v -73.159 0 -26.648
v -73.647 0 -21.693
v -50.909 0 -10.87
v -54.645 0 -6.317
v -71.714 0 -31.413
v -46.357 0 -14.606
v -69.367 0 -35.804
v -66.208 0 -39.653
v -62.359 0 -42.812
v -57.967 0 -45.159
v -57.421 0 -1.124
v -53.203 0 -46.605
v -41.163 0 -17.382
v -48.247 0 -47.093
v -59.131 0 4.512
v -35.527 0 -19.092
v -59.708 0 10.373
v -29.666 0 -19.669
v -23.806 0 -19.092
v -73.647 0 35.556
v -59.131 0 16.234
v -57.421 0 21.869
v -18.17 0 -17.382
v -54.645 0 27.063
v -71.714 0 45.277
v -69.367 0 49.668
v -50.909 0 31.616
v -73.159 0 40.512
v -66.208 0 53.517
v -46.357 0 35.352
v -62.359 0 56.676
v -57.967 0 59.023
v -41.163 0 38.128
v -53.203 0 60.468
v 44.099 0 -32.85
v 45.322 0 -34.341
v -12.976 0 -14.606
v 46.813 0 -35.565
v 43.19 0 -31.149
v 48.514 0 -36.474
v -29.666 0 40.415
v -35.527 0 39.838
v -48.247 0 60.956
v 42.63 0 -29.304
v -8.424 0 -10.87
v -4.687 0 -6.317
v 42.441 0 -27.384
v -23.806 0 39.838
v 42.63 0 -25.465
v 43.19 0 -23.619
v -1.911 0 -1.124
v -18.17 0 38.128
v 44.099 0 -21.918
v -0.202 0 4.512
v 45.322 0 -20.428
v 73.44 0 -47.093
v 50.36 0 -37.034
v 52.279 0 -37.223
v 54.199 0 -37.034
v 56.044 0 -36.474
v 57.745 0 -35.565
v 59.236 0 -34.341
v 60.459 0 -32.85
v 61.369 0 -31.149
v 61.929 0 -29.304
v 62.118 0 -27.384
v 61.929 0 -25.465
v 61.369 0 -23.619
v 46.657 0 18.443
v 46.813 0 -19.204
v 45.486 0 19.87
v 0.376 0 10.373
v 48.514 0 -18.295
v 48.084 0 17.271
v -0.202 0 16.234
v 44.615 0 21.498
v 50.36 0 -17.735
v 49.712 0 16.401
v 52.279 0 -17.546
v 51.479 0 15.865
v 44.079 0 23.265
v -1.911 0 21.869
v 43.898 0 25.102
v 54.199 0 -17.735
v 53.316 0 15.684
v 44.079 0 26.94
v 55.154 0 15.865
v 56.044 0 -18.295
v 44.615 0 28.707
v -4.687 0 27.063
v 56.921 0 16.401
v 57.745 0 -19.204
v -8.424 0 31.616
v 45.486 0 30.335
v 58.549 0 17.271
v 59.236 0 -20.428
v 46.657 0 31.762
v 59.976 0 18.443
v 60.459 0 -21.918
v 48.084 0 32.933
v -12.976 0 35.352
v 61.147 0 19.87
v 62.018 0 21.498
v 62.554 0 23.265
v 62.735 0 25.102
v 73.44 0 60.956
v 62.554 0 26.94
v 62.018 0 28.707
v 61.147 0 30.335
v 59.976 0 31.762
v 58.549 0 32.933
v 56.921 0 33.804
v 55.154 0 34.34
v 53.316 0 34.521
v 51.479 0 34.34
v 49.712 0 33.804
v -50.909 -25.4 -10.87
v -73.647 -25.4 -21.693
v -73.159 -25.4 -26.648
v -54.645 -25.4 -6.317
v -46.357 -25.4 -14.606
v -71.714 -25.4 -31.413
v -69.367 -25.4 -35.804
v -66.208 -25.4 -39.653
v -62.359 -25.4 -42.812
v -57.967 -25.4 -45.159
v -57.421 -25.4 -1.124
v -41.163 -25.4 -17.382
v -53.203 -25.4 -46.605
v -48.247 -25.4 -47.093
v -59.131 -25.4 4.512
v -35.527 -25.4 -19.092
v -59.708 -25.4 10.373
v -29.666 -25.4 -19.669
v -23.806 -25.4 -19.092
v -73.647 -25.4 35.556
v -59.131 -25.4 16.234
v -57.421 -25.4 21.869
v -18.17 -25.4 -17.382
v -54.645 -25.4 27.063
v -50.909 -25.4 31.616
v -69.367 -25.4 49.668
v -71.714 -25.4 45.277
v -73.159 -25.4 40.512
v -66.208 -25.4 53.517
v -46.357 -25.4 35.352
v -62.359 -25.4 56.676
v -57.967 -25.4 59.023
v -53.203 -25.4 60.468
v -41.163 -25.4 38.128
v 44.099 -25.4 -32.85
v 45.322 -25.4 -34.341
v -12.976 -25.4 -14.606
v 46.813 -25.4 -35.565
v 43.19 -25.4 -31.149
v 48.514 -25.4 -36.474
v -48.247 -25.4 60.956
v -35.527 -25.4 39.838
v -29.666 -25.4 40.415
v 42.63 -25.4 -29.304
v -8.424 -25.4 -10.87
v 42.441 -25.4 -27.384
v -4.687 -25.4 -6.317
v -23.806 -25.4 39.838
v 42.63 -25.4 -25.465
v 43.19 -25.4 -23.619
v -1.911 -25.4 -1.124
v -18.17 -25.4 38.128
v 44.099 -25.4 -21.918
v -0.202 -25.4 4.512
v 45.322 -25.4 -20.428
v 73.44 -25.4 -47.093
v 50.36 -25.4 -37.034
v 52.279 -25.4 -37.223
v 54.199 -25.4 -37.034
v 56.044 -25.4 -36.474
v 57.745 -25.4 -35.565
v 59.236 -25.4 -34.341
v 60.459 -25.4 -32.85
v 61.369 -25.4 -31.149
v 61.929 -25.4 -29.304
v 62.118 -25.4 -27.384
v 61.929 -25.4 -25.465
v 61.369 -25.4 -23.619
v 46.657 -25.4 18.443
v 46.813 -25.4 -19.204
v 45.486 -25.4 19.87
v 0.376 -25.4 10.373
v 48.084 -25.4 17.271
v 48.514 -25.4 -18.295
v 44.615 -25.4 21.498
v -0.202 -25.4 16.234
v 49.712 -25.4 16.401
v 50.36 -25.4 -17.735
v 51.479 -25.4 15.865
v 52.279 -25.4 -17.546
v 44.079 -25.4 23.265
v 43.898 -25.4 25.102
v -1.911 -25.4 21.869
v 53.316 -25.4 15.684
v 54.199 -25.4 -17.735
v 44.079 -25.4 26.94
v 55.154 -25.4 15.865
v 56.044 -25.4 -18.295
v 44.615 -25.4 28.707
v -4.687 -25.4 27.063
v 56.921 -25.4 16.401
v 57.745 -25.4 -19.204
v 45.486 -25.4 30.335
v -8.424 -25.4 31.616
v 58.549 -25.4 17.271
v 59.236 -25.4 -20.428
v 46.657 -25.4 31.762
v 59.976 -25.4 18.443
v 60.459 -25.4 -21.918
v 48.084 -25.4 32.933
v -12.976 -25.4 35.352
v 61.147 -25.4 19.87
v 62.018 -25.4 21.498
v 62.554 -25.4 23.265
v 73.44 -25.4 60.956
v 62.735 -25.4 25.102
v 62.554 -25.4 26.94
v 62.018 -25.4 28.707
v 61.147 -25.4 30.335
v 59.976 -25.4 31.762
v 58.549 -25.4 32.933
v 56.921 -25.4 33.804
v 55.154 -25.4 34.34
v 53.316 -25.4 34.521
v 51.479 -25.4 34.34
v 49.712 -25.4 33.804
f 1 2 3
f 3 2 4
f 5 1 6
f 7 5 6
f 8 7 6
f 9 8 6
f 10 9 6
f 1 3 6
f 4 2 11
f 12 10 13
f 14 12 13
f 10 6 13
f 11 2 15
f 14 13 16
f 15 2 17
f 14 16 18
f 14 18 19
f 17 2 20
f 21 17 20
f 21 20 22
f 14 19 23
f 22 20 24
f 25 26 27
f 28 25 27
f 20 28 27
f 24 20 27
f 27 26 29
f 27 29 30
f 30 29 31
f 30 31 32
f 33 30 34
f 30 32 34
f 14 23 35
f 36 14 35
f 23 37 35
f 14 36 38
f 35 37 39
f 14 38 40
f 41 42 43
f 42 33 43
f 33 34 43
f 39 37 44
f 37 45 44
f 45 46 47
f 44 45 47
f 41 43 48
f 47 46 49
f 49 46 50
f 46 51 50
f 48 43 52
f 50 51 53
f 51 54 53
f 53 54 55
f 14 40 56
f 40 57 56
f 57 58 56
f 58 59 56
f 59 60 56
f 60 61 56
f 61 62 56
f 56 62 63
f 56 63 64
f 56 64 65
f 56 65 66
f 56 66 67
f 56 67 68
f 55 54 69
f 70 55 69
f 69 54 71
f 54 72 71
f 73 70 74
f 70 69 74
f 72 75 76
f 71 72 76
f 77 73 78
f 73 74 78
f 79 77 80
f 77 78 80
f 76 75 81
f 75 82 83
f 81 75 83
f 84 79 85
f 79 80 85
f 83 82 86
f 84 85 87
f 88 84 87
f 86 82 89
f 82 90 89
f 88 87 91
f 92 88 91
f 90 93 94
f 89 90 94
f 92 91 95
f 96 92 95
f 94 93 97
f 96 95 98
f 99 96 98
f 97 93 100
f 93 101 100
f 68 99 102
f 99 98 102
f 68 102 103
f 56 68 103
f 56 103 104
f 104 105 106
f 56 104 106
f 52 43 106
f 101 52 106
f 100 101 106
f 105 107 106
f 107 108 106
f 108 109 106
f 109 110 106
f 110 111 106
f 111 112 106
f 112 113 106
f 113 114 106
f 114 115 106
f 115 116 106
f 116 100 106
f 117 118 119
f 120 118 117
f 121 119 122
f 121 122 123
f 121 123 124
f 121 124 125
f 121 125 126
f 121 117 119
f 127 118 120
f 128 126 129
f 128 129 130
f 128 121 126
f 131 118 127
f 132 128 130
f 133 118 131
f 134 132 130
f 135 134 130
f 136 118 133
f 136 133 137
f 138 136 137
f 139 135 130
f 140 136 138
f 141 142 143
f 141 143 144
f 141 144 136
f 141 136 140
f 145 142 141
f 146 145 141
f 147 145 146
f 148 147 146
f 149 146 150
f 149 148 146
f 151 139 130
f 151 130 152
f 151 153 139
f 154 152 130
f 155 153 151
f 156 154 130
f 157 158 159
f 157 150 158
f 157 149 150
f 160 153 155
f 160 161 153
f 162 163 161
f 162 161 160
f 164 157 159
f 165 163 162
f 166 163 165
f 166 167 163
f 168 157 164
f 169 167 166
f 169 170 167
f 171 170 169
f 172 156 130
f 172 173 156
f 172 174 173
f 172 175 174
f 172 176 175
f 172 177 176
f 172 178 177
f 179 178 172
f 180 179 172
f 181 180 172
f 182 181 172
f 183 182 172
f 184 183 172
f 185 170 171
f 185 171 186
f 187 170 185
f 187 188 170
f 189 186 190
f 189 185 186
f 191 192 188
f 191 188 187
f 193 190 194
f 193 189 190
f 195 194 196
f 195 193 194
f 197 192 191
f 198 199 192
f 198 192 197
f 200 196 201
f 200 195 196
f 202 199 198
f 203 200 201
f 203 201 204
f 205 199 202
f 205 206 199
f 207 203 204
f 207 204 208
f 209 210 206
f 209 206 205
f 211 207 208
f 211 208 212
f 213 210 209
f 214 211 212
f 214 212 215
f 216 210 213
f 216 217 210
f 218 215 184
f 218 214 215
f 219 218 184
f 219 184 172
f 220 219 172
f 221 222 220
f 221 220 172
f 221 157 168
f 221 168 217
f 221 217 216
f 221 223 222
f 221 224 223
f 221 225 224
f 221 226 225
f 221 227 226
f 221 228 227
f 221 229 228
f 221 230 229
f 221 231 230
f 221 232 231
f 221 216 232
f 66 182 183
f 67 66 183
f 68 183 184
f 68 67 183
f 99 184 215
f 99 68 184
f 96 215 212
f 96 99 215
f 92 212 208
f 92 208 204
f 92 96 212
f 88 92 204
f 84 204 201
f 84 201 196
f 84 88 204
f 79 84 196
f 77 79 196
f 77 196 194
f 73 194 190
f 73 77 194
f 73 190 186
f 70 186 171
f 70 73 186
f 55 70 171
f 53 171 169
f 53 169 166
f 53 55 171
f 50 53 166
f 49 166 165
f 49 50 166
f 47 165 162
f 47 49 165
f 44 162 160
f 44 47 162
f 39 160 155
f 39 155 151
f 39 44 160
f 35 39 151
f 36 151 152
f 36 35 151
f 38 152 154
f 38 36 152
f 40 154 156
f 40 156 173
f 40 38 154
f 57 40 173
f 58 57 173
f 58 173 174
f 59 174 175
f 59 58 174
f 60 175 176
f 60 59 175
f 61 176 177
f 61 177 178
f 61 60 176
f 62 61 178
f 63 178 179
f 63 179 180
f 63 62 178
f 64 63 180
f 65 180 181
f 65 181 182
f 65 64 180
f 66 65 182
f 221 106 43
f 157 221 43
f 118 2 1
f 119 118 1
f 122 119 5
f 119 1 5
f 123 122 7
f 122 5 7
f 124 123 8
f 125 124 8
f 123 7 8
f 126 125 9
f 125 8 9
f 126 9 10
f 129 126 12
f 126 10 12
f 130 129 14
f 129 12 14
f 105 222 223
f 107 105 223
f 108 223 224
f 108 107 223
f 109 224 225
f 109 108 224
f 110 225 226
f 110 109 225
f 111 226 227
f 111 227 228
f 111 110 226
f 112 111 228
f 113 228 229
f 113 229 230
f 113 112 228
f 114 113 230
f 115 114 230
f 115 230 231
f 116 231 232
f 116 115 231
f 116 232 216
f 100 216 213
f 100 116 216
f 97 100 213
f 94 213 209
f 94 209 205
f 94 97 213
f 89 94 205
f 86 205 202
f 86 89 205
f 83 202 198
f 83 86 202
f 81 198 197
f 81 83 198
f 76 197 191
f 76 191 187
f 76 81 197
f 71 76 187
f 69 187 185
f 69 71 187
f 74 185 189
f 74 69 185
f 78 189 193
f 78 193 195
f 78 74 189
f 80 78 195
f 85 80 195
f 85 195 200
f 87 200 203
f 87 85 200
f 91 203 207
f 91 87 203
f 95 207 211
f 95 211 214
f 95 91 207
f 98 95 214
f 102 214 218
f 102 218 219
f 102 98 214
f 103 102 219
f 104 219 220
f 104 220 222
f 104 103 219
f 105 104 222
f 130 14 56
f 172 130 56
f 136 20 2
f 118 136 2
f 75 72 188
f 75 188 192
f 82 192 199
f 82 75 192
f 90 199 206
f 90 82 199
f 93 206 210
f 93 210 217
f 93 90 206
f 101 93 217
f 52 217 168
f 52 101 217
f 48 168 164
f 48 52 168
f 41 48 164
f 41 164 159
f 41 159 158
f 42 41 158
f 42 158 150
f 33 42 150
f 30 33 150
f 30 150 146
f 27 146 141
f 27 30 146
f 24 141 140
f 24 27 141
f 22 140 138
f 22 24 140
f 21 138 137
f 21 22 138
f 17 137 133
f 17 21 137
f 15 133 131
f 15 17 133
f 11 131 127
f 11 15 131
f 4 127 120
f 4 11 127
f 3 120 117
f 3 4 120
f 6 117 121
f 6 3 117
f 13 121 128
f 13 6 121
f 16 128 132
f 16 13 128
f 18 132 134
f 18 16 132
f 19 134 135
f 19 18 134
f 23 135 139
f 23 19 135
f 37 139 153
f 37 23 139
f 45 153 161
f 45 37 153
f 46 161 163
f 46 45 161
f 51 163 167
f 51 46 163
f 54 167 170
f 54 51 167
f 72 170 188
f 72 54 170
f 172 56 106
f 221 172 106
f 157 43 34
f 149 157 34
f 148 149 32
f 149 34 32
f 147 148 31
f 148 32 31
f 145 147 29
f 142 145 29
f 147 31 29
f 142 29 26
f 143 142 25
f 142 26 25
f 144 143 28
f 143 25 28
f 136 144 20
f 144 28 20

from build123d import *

# Parameters (mm, degrees)
F0_R     = 9.838377
F0_R_2   = 30.041909
F0_R_3   = 9.418189
F1_DEPTH = 25.4


with BuildPart() as f1:
    # F0 (on Front) → F1 (new body)
    with BuildSketch(Plane.XZ):
        with BuildLine():
            Line((73.439807, 60.956387), (-48.24732, 60.956387))
            ThreePointArc((-48.24732, 60.956387), (-66.207833, 53.516899), (-73.64732, 35.556387))
            Line((-73.64732, 35.556387), (-73.64732, -21.692736))
            ThreePointArc((-73.64732, -21.692736), (-66.207833, -39.653248), (-48.24732, -47.092736))
            Line((-48.24732, -47.092736), (73.439807, -47.092736))
            Line((73.439807, -47.092736), (73.439807, 60.956387))
        make_face()
        with Locations((52.279174, -27.384311)):
            Circle(F0_R, mode=Mode.SUBTRACT)
        with Locations((-29.666394, 10.372892)):
            Circle(F0_R_2, mode=Mode.SUBTRACT)
        with Locations((53.316444, 25.102355)):
            Circle(F0_R_3, mode=Mode.SUBTRACT)
    extrude(amount=F1_DEPTH)


solid = f1.part
